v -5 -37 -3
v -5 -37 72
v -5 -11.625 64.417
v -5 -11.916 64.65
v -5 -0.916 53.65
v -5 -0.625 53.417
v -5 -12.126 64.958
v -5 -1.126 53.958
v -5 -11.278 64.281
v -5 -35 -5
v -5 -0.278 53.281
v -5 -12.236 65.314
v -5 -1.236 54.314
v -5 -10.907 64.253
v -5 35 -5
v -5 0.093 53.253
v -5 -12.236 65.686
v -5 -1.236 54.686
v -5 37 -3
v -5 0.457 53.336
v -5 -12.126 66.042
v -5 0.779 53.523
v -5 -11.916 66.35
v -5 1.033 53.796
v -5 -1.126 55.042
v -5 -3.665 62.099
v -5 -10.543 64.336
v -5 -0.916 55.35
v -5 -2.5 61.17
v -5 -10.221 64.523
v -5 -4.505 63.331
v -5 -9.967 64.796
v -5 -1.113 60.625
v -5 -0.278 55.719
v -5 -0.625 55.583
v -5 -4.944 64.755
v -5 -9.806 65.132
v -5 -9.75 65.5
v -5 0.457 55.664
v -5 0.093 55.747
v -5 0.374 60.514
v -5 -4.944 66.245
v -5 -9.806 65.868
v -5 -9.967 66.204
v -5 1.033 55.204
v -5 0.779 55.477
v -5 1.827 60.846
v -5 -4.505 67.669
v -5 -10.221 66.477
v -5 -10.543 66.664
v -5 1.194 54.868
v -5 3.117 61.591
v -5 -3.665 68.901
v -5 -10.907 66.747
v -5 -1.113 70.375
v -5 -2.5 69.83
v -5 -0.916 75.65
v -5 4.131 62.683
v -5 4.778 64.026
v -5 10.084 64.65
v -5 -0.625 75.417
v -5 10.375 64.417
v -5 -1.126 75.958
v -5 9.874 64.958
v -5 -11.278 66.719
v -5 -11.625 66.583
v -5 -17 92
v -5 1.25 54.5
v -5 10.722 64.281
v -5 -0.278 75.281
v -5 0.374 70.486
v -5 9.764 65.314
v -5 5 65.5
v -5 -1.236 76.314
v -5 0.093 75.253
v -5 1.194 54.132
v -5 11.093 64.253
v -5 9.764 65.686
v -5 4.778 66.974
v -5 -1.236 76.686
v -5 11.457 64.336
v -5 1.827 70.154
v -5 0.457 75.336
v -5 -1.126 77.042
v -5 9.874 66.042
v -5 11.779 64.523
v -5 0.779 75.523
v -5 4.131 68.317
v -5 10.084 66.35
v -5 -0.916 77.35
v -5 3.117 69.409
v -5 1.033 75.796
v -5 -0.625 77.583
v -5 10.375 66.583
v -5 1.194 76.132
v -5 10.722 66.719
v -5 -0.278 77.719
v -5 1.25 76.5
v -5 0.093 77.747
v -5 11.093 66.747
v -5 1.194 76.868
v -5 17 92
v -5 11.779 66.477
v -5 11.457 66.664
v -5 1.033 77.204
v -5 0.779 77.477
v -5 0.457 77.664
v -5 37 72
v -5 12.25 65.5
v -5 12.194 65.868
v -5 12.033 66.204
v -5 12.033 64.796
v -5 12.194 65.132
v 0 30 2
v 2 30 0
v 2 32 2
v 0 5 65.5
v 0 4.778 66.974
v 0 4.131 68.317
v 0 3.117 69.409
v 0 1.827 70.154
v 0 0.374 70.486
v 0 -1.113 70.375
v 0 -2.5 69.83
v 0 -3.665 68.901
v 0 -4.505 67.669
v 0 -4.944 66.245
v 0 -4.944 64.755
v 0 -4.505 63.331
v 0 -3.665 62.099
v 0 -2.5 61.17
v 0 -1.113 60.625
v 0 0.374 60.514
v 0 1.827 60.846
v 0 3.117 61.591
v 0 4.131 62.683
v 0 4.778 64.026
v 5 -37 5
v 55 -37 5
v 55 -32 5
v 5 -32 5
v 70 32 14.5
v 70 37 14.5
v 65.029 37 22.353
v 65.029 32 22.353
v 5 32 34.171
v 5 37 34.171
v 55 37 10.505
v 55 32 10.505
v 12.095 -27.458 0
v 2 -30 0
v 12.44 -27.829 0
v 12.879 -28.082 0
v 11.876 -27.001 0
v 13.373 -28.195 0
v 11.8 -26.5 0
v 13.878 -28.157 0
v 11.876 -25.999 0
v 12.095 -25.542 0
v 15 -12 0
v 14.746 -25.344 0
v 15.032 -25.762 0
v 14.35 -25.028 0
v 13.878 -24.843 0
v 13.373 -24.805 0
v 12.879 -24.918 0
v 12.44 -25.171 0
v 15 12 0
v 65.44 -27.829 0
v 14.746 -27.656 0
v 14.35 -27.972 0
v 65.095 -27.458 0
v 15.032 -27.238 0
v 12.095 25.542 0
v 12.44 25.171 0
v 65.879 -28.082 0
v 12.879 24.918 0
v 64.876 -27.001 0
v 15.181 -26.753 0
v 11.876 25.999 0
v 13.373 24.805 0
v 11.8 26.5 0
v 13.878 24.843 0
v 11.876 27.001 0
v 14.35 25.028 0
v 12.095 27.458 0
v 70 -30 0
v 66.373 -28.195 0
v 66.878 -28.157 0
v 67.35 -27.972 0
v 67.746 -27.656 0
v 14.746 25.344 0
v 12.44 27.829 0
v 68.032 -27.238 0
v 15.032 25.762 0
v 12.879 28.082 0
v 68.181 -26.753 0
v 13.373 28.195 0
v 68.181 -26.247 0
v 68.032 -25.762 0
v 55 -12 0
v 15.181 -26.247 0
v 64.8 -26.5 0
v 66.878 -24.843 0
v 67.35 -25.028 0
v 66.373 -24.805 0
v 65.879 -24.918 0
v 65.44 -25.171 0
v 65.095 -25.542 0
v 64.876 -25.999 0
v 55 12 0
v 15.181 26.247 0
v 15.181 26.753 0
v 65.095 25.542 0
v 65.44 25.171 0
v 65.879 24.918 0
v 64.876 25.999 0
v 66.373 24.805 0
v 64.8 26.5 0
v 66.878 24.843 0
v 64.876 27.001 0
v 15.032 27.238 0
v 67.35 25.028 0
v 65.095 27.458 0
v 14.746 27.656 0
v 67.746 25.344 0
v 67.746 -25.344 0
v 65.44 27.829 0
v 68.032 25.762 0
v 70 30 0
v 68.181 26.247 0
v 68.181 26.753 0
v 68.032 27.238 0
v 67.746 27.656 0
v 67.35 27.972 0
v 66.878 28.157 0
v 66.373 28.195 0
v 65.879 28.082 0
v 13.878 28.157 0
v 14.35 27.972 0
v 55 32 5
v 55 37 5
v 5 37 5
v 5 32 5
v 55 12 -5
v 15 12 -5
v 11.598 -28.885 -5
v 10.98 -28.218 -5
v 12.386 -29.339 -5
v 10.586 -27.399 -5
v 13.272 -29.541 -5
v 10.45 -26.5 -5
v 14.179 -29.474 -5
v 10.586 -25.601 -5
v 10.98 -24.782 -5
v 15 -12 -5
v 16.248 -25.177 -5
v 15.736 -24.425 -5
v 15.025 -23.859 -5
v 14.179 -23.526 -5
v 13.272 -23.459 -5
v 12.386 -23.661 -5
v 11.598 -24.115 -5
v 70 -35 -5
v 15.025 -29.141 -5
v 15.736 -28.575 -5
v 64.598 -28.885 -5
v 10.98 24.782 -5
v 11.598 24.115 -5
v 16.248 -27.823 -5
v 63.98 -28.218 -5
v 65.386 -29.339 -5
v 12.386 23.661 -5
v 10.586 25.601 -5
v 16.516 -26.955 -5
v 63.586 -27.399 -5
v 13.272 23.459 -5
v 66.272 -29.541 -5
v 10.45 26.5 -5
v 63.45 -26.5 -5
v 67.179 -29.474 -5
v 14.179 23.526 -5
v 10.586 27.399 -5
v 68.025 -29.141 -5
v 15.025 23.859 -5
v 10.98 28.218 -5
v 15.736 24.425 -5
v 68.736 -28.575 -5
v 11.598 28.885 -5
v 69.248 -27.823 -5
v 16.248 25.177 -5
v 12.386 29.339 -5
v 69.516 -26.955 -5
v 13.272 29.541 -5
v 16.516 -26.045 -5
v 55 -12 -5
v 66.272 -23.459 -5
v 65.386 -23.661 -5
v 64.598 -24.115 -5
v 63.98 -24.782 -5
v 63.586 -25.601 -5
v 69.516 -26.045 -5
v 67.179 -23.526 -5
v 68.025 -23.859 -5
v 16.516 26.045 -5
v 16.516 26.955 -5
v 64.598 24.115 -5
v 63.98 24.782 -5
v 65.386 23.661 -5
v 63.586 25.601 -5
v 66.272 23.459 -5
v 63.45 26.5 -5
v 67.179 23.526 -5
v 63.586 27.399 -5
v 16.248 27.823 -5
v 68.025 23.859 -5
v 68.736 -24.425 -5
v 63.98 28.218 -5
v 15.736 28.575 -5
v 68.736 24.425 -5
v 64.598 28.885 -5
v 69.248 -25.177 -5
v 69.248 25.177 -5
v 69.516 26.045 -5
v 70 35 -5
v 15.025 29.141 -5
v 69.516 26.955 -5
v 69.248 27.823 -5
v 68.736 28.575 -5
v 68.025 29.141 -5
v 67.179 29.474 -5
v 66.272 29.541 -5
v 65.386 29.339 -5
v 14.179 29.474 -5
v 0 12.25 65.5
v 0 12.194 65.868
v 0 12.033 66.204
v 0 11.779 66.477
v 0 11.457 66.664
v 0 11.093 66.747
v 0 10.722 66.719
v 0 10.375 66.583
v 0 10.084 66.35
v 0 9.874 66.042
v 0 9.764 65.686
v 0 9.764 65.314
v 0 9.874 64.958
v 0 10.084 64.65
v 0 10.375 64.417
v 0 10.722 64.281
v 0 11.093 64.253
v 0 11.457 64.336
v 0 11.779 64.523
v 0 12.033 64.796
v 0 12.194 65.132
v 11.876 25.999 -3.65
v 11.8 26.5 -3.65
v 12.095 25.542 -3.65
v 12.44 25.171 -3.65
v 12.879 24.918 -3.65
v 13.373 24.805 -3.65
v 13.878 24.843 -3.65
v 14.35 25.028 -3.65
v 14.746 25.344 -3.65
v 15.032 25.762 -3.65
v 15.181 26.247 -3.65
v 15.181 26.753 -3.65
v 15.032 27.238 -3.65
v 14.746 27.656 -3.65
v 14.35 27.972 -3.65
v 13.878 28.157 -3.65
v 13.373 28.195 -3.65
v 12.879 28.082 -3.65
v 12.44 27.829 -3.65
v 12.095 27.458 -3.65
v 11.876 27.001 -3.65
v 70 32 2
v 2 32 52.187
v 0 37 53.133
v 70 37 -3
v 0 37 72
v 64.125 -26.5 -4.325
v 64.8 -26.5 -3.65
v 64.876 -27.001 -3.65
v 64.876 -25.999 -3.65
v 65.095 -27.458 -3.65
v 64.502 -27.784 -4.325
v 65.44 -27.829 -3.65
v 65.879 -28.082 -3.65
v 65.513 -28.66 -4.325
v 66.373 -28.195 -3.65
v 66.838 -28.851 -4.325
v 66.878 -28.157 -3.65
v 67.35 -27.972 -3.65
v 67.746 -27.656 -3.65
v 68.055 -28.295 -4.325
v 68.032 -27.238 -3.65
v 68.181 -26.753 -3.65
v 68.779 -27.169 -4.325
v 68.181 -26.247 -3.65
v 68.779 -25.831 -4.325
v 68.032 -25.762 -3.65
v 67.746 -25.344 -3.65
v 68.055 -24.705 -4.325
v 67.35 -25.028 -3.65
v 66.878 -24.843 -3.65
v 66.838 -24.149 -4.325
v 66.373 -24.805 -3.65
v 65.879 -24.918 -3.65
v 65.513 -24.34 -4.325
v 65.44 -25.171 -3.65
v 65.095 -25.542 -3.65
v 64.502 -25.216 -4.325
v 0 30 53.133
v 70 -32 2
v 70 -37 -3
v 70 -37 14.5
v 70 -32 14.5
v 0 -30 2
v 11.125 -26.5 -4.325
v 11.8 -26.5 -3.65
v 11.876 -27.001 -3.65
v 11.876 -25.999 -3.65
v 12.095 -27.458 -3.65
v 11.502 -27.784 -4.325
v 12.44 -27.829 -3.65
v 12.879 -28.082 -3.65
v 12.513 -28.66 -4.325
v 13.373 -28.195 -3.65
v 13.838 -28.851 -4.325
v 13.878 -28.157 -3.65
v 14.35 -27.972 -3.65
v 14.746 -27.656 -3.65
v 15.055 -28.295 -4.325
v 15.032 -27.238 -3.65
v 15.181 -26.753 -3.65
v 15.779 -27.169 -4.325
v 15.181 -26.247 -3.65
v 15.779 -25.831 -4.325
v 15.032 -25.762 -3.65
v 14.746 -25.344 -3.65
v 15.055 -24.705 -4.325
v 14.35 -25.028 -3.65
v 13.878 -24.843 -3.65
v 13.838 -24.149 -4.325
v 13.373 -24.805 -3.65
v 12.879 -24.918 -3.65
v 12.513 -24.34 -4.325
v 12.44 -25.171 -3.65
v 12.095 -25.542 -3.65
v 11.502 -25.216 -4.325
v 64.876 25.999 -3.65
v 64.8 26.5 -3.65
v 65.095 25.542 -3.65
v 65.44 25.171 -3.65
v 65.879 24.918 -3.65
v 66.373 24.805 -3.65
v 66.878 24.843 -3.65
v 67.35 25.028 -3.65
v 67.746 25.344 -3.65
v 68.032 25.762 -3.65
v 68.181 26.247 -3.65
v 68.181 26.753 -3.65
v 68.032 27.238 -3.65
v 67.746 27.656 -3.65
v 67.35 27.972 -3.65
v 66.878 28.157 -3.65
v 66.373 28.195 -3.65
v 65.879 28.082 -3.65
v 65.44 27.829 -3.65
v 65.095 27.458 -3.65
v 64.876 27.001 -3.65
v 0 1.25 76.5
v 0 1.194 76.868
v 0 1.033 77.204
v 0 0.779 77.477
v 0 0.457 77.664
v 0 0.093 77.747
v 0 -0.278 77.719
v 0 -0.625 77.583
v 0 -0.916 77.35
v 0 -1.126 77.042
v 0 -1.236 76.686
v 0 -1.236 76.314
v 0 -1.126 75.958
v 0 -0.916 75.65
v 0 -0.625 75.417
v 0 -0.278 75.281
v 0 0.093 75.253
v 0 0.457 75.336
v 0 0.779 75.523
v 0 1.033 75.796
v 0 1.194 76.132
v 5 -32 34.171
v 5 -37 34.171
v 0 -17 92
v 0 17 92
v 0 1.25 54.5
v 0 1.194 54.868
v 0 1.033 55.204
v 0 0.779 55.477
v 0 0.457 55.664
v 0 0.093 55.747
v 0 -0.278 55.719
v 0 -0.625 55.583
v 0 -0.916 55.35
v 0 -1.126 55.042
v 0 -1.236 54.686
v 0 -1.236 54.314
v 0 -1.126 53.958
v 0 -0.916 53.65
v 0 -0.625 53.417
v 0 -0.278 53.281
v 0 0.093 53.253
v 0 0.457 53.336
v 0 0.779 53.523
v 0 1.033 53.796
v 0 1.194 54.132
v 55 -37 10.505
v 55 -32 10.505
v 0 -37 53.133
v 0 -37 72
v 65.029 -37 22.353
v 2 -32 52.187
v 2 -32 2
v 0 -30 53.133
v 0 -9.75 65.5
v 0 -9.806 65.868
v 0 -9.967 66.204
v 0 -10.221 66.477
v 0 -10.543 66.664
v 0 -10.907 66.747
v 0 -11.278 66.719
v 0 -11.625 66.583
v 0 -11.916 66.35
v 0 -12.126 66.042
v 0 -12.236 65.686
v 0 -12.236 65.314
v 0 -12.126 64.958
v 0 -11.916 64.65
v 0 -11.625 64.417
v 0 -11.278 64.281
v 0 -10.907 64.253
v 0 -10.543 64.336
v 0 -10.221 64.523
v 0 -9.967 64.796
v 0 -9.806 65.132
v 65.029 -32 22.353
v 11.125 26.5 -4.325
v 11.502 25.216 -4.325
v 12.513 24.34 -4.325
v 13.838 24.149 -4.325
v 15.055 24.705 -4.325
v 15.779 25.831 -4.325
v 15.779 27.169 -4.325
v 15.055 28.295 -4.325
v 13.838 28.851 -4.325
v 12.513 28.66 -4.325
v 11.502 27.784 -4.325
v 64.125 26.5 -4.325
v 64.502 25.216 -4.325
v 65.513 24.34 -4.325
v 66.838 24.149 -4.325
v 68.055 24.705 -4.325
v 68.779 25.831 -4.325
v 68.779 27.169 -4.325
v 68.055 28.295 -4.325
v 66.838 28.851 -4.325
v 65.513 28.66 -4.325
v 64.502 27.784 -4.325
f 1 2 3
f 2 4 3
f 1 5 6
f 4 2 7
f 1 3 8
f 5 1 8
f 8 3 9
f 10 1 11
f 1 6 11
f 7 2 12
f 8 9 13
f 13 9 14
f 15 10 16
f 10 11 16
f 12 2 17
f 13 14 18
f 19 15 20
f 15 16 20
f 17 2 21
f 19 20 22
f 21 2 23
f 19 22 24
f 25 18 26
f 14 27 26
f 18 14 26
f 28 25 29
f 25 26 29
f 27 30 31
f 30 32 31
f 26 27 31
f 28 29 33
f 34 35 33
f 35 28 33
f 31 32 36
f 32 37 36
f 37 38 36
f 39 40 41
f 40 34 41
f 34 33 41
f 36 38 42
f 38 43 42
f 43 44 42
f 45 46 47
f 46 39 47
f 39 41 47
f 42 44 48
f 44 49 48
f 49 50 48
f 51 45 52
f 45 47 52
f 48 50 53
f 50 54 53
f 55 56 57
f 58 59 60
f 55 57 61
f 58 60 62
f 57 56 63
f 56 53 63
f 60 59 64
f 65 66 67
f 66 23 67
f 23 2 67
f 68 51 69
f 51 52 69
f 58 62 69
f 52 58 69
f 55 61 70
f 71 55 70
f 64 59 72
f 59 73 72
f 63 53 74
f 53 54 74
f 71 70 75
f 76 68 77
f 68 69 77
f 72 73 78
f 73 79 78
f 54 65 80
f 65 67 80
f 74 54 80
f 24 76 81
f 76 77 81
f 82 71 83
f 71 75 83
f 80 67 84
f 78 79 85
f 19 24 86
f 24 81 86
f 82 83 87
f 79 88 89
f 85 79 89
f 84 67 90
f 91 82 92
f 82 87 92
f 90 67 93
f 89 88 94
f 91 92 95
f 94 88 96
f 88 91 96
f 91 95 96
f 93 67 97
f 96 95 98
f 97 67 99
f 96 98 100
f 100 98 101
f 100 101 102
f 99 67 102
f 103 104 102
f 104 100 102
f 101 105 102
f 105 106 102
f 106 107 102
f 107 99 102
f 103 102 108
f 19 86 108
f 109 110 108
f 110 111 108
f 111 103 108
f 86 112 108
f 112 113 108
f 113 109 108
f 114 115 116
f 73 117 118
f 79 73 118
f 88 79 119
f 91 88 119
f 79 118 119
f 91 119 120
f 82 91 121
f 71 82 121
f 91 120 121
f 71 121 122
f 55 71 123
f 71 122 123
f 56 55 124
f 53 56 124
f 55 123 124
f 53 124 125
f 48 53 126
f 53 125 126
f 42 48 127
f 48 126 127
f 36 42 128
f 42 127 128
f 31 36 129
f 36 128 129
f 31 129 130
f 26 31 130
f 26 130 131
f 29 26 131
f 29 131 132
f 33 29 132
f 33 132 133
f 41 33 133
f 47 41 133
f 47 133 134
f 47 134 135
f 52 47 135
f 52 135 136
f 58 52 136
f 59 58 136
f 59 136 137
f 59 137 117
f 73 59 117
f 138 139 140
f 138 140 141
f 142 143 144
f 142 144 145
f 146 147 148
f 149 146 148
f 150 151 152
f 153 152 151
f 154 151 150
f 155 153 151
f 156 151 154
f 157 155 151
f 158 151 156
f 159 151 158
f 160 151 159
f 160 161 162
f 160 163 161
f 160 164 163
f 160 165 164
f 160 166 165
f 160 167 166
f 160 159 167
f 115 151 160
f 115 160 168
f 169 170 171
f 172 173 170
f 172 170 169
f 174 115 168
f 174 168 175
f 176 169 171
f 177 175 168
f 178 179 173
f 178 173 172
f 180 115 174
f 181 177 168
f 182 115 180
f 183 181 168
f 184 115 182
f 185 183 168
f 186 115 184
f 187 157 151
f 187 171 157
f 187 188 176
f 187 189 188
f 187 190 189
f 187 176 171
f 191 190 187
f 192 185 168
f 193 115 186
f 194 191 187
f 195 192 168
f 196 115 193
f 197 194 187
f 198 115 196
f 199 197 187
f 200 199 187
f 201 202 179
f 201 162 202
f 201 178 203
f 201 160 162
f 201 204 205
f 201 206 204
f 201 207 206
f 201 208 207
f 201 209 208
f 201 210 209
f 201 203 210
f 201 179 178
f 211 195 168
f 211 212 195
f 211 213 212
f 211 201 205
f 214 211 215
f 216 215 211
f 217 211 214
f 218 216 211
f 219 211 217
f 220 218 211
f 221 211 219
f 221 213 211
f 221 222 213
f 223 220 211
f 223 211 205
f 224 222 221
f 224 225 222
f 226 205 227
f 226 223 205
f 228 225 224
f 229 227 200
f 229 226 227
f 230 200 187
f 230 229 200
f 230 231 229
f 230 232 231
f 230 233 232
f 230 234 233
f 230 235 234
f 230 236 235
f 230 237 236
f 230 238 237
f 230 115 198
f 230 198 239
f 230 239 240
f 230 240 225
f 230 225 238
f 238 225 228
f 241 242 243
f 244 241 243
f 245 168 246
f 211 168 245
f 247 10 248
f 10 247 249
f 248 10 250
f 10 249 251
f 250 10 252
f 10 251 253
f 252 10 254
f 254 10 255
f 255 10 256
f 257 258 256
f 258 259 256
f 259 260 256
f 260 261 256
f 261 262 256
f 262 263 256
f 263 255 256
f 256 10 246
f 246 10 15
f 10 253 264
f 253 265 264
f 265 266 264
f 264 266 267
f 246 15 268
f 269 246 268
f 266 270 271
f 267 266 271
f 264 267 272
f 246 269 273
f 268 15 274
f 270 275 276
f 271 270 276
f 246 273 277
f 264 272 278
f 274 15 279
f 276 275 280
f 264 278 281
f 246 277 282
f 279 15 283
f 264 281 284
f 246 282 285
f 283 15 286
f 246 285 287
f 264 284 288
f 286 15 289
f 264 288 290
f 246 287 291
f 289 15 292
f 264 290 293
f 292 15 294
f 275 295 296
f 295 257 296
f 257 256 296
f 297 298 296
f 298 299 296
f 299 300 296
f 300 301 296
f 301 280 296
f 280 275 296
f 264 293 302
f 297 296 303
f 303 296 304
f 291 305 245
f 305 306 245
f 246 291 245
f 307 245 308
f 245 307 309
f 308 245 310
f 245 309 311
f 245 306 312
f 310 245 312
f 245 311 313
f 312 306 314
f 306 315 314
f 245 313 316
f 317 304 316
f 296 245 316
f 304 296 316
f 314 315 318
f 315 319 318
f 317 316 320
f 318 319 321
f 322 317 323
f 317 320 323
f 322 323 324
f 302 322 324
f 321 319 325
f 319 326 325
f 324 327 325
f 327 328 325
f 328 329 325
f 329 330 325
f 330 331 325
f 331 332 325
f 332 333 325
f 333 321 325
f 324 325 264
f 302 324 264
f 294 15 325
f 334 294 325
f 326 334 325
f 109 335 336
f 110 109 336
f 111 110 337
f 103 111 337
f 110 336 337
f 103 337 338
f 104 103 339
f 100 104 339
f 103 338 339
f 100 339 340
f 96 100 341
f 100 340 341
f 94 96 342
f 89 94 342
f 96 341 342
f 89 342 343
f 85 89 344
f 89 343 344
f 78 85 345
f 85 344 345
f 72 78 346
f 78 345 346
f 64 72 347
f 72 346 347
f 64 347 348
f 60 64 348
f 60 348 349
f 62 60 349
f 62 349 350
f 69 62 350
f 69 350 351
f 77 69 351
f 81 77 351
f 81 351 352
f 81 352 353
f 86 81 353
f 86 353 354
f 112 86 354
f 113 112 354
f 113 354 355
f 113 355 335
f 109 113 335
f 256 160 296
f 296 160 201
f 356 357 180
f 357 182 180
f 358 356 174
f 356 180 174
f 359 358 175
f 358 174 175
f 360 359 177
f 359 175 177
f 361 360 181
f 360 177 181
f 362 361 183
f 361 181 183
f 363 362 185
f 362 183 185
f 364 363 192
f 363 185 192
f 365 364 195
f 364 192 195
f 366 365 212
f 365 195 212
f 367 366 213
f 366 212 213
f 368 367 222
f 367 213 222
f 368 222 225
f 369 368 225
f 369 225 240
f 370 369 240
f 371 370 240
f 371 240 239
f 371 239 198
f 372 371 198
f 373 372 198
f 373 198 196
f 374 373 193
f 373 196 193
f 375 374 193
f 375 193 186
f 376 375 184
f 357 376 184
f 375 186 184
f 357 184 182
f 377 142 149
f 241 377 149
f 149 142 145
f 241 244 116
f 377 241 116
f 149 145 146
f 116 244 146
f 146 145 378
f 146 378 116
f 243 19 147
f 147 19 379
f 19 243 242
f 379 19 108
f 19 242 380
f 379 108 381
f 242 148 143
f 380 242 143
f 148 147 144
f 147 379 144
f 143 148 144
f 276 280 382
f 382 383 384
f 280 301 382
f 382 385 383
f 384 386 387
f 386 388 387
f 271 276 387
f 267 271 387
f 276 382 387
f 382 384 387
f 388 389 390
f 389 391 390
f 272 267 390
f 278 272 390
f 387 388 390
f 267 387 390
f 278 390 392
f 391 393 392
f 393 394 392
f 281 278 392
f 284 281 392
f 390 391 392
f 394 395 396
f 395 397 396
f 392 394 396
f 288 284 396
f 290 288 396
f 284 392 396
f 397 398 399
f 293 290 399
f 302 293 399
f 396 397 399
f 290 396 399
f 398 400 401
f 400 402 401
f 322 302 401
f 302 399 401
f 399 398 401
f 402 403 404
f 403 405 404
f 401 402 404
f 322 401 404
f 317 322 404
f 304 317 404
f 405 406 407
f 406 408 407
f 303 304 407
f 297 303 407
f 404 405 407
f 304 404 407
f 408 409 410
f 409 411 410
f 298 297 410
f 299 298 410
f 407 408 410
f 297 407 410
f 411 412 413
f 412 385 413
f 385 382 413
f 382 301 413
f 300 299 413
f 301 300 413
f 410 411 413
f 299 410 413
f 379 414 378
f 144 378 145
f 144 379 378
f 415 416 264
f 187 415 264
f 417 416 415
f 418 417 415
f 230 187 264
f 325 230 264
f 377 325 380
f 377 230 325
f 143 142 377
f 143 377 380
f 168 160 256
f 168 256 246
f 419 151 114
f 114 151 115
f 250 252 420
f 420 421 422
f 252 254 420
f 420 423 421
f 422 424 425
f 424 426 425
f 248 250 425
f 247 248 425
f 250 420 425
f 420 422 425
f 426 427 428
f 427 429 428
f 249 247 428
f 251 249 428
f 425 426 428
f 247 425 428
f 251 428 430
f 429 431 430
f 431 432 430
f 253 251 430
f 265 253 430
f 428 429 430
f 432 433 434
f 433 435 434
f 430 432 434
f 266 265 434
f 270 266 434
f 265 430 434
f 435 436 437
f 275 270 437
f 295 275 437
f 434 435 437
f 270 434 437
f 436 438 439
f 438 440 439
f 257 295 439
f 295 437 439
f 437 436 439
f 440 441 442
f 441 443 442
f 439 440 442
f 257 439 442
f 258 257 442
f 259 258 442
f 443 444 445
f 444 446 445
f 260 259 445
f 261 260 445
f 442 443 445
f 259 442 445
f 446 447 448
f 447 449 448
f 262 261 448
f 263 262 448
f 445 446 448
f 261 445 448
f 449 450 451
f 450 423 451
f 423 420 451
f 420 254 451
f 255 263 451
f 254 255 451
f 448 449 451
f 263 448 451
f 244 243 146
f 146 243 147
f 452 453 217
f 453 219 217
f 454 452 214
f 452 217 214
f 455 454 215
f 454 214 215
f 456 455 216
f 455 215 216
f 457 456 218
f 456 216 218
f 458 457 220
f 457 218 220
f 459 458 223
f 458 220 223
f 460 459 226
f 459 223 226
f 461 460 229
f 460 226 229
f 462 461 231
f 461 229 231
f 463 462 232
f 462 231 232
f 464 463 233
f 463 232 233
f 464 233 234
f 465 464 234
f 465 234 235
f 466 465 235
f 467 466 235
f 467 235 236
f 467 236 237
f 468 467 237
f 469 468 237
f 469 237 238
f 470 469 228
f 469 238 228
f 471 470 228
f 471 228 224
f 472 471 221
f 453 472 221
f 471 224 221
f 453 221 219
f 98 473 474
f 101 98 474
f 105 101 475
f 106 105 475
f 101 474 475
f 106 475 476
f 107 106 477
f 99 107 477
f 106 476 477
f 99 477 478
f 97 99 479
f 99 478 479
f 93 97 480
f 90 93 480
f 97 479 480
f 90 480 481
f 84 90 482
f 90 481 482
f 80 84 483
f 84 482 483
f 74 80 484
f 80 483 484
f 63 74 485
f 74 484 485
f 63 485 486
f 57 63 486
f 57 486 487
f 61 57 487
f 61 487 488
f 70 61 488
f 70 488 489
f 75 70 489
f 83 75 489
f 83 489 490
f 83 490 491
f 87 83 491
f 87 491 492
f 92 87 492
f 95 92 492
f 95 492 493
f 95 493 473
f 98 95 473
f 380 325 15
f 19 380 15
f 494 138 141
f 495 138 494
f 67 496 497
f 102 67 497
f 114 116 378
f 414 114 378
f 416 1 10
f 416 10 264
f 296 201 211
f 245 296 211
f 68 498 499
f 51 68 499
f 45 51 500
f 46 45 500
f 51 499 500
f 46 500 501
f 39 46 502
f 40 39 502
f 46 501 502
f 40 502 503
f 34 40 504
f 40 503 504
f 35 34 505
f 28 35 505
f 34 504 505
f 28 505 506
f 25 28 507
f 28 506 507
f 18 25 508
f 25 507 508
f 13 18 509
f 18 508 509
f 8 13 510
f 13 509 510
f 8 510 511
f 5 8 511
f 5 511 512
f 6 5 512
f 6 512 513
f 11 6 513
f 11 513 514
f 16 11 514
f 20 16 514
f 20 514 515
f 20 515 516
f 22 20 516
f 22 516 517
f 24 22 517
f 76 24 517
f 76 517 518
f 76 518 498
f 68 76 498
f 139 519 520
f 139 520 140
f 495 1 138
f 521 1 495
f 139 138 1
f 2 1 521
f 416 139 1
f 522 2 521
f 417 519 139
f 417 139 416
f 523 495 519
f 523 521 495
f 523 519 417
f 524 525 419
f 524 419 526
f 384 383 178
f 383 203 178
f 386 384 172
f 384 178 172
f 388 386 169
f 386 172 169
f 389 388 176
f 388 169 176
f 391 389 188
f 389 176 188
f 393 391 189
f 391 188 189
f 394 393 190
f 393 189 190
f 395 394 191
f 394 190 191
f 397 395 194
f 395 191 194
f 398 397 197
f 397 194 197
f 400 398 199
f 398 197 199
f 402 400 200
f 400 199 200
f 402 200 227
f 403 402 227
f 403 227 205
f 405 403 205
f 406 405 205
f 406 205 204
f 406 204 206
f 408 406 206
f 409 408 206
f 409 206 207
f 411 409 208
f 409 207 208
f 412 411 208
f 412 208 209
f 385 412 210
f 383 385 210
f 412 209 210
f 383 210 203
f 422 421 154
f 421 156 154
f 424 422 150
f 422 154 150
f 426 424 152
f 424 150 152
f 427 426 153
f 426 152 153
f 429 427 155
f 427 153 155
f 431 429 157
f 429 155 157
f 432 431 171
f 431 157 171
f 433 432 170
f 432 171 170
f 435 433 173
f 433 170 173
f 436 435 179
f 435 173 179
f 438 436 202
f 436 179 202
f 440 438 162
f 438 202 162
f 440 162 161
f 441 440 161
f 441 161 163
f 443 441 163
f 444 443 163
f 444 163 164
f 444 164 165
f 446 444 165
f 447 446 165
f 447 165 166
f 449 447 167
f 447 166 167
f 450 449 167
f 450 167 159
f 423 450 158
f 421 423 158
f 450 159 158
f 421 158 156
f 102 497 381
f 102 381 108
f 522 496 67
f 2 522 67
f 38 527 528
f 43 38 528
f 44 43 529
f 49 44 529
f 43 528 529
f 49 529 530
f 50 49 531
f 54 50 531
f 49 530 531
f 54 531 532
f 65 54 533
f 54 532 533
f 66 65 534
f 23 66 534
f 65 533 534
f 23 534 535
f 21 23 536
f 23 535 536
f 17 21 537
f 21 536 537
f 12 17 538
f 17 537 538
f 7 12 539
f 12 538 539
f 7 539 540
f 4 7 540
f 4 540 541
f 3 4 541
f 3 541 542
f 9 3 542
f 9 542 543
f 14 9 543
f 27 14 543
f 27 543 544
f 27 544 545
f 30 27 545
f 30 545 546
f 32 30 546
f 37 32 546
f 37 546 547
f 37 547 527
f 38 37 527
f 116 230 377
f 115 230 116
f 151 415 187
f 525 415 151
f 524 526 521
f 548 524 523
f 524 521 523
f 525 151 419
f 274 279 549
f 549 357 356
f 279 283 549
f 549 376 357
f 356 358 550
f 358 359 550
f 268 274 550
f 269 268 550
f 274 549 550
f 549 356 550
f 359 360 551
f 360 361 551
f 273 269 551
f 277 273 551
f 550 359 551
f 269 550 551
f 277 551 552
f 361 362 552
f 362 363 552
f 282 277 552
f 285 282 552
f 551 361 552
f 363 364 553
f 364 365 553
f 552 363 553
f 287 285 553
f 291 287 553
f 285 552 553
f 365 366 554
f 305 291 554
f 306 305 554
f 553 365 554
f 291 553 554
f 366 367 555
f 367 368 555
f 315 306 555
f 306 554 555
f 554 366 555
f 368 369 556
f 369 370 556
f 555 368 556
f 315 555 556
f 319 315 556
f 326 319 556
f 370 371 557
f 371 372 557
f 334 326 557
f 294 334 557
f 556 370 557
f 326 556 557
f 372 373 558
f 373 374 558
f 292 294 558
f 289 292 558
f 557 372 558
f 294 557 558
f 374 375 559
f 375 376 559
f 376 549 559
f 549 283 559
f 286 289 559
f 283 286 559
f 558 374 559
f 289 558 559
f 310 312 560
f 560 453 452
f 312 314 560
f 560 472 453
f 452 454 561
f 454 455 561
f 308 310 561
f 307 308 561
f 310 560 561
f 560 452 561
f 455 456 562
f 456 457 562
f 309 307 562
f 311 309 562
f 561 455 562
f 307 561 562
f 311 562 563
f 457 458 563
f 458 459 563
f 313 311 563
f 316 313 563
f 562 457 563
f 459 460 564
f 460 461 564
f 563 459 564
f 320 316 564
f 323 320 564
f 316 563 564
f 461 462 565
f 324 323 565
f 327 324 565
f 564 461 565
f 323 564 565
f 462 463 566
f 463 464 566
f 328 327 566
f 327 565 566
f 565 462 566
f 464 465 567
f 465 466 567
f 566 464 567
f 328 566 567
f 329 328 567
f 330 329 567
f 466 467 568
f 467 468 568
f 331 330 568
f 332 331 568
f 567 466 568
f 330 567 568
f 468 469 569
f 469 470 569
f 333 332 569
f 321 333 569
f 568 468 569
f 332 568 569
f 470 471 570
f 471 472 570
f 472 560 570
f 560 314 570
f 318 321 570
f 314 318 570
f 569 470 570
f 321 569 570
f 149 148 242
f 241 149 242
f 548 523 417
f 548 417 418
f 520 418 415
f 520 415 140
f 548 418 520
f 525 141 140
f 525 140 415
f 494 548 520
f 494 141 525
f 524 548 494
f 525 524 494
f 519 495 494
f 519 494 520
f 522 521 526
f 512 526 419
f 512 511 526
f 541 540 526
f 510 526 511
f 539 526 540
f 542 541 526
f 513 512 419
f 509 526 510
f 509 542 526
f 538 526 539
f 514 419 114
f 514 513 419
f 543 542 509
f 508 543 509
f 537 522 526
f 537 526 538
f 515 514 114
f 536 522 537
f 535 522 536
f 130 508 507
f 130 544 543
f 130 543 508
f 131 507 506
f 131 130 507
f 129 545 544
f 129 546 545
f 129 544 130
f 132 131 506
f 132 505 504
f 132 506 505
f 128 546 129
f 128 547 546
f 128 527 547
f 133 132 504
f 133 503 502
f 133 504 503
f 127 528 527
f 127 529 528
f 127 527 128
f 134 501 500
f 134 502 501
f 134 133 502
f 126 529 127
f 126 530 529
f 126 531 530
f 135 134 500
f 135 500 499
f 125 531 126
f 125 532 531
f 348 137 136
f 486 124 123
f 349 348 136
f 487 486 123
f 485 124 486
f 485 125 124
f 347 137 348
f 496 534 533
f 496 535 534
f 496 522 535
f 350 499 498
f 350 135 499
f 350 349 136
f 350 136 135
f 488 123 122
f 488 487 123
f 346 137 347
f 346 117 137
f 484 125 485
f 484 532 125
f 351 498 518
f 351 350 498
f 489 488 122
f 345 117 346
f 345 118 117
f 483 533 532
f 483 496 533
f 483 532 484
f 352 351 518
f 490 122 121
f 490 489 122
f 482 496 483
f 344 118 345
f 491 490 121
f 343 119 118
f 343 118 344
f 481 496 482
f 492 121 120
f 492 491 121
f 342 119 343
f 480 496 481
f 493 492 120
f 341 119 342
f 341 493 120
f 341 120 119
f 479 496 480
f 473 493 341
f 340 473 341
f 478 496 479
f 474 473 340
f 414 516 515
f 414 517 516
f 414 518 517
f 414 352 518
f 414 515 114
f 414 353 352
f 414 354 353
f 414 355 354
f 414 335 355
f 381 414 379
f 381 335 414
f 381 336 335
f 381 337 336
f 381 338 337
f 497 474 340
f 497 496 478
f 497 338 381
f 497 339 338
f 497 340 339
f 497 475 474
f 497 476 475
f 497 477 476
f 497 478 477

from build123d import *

# Parameters (mm, degrees)
SKETCH004_W      = 75
SKETCH004_H      = 74
SKETCH004_W_2    = 40
SKETCH004_H_2    = 24
PAD_DEPTH        = 5
SKETCH006_W      = 74
SKETCH006_H      = 97
PAD003_DEPTH     = 5
PAD004_DEPTH     = 5
HOLE_D           = 3.4
HOLE_CSINK_D     = 6.1
HOLE_CSINK_ANGLE = 90
SKETCH002_R      = 5
SKETCH002_R_2    = 1.25
POCKET_DEPTH     = 5.001
CHAMFER_SIZE     = 2
CHAMFER001_SIZE  = 5.5
CHAMFER002_SIZE  = 20


with BuildPart() as part:
    # Sketch004 → Pad (new body)
    with BuildSketch(Plane.XY):
        with Locations((32.5, 0)):
            Rectangle(SKETCH004_W, SKETCH004_H)
        with Locations((35, 0)):
            Rectangle(SKETCH004_W_2, SKETCH004_H_2, mode=Mode.SUBTRACT)
    extrude(amount=-PAD_DEPTH)

    # Sketch006 → Pad003 (join)
    with BuildSketch(Plane.YZ):
        with Locations((0, 43.5)):
            Rectangle(SKETCH006_W, SKETCH006_H)
    extrude(amount=-PAD003_DEPTH)

    # Sketch001 → Pad004 (join)
    with BuildSketch(Plane.XZ.offset(37)):
        Polygon((-5, 55.5), (70, 20), (70, -5), (-5, -5), align=None)
        Polygon((5, 34.171185), (55, 10.504519), (55, 5), (5, 5), align=None, mode=Mode.SUBTRACT)
    pad004 = extrude(amount=-PAD004_DEPTH)

    # Mirrored: Pad004 across XZ
    add(pad004.mirror(Plane.XZ))

    # Hole (through all)
    with Locations(Plane(origin=(0, 0, -5), x_dir=(1, 0, 0), z_dir=(0, 0, -1))):
        with Locations((66.5, -26.5), (13.5, -26.5), (13.5, 26.5), (66.5, 26.5)):
            CounterSinkHole(HOLE_D / 2, HOLE_CSINK_D / 2, counter_sink_angle=HOLE_CSINK_ANGLE)

    # Sketch002 → Pocket (cut, through all)
    with BuildSketch(Plane.YZ):
        with Locations((0, 65.5)):
            Circle(SKETCH002_R)
        with Locations((0, 76.5)):
            Circle(SKETCH002_R_2)
        with Locations((11, 65.5)):
            Circle(SKETCH002_R_2)
        with Locations((0, 54.5)):
            Circle(SKETCH002_R_2)
        with Locations((-11, 65.5)):
            Circle(SKETCH002_R_2)
    extrude(amount=-POCKET_DEPTH, mode=Mode.SUBTRACT)

    # Chamfer
    chamfer_edges = [part.edges().sort_by_distance(p)[0] for p in [
        (0, 0, 0),
        (35, 32, 0),
        (35, -32, 0),
        (0, -32, 26.566667),
        (0, 32, 26.566667),
        (32.5, -37, -5),
        (32.5, 37, -5),
    ]]
    chamfer(chamfer_edges, length=CHAMFER_SIZE)

    # Chamfer001
    chamfer001_edges = [part.edges().sort_by_distance(p)[0] for p in [
        (70, -34.5, 20),
        (70, 34.5, 20),
    ]]
    chamfer(chamfer001_edges, length=CHAMFER001_SIZE)

    # Chamfer002
    chamfer002_edges = [part.edges().sort_by_distance(p)[0] for p in [
        (-2.5, -37, 92),
        (-2.5, 37, 92),
    ]]
    chamfer(chamfer002_edges, length=CHAMFER002_SIZE)


solid = part.part
